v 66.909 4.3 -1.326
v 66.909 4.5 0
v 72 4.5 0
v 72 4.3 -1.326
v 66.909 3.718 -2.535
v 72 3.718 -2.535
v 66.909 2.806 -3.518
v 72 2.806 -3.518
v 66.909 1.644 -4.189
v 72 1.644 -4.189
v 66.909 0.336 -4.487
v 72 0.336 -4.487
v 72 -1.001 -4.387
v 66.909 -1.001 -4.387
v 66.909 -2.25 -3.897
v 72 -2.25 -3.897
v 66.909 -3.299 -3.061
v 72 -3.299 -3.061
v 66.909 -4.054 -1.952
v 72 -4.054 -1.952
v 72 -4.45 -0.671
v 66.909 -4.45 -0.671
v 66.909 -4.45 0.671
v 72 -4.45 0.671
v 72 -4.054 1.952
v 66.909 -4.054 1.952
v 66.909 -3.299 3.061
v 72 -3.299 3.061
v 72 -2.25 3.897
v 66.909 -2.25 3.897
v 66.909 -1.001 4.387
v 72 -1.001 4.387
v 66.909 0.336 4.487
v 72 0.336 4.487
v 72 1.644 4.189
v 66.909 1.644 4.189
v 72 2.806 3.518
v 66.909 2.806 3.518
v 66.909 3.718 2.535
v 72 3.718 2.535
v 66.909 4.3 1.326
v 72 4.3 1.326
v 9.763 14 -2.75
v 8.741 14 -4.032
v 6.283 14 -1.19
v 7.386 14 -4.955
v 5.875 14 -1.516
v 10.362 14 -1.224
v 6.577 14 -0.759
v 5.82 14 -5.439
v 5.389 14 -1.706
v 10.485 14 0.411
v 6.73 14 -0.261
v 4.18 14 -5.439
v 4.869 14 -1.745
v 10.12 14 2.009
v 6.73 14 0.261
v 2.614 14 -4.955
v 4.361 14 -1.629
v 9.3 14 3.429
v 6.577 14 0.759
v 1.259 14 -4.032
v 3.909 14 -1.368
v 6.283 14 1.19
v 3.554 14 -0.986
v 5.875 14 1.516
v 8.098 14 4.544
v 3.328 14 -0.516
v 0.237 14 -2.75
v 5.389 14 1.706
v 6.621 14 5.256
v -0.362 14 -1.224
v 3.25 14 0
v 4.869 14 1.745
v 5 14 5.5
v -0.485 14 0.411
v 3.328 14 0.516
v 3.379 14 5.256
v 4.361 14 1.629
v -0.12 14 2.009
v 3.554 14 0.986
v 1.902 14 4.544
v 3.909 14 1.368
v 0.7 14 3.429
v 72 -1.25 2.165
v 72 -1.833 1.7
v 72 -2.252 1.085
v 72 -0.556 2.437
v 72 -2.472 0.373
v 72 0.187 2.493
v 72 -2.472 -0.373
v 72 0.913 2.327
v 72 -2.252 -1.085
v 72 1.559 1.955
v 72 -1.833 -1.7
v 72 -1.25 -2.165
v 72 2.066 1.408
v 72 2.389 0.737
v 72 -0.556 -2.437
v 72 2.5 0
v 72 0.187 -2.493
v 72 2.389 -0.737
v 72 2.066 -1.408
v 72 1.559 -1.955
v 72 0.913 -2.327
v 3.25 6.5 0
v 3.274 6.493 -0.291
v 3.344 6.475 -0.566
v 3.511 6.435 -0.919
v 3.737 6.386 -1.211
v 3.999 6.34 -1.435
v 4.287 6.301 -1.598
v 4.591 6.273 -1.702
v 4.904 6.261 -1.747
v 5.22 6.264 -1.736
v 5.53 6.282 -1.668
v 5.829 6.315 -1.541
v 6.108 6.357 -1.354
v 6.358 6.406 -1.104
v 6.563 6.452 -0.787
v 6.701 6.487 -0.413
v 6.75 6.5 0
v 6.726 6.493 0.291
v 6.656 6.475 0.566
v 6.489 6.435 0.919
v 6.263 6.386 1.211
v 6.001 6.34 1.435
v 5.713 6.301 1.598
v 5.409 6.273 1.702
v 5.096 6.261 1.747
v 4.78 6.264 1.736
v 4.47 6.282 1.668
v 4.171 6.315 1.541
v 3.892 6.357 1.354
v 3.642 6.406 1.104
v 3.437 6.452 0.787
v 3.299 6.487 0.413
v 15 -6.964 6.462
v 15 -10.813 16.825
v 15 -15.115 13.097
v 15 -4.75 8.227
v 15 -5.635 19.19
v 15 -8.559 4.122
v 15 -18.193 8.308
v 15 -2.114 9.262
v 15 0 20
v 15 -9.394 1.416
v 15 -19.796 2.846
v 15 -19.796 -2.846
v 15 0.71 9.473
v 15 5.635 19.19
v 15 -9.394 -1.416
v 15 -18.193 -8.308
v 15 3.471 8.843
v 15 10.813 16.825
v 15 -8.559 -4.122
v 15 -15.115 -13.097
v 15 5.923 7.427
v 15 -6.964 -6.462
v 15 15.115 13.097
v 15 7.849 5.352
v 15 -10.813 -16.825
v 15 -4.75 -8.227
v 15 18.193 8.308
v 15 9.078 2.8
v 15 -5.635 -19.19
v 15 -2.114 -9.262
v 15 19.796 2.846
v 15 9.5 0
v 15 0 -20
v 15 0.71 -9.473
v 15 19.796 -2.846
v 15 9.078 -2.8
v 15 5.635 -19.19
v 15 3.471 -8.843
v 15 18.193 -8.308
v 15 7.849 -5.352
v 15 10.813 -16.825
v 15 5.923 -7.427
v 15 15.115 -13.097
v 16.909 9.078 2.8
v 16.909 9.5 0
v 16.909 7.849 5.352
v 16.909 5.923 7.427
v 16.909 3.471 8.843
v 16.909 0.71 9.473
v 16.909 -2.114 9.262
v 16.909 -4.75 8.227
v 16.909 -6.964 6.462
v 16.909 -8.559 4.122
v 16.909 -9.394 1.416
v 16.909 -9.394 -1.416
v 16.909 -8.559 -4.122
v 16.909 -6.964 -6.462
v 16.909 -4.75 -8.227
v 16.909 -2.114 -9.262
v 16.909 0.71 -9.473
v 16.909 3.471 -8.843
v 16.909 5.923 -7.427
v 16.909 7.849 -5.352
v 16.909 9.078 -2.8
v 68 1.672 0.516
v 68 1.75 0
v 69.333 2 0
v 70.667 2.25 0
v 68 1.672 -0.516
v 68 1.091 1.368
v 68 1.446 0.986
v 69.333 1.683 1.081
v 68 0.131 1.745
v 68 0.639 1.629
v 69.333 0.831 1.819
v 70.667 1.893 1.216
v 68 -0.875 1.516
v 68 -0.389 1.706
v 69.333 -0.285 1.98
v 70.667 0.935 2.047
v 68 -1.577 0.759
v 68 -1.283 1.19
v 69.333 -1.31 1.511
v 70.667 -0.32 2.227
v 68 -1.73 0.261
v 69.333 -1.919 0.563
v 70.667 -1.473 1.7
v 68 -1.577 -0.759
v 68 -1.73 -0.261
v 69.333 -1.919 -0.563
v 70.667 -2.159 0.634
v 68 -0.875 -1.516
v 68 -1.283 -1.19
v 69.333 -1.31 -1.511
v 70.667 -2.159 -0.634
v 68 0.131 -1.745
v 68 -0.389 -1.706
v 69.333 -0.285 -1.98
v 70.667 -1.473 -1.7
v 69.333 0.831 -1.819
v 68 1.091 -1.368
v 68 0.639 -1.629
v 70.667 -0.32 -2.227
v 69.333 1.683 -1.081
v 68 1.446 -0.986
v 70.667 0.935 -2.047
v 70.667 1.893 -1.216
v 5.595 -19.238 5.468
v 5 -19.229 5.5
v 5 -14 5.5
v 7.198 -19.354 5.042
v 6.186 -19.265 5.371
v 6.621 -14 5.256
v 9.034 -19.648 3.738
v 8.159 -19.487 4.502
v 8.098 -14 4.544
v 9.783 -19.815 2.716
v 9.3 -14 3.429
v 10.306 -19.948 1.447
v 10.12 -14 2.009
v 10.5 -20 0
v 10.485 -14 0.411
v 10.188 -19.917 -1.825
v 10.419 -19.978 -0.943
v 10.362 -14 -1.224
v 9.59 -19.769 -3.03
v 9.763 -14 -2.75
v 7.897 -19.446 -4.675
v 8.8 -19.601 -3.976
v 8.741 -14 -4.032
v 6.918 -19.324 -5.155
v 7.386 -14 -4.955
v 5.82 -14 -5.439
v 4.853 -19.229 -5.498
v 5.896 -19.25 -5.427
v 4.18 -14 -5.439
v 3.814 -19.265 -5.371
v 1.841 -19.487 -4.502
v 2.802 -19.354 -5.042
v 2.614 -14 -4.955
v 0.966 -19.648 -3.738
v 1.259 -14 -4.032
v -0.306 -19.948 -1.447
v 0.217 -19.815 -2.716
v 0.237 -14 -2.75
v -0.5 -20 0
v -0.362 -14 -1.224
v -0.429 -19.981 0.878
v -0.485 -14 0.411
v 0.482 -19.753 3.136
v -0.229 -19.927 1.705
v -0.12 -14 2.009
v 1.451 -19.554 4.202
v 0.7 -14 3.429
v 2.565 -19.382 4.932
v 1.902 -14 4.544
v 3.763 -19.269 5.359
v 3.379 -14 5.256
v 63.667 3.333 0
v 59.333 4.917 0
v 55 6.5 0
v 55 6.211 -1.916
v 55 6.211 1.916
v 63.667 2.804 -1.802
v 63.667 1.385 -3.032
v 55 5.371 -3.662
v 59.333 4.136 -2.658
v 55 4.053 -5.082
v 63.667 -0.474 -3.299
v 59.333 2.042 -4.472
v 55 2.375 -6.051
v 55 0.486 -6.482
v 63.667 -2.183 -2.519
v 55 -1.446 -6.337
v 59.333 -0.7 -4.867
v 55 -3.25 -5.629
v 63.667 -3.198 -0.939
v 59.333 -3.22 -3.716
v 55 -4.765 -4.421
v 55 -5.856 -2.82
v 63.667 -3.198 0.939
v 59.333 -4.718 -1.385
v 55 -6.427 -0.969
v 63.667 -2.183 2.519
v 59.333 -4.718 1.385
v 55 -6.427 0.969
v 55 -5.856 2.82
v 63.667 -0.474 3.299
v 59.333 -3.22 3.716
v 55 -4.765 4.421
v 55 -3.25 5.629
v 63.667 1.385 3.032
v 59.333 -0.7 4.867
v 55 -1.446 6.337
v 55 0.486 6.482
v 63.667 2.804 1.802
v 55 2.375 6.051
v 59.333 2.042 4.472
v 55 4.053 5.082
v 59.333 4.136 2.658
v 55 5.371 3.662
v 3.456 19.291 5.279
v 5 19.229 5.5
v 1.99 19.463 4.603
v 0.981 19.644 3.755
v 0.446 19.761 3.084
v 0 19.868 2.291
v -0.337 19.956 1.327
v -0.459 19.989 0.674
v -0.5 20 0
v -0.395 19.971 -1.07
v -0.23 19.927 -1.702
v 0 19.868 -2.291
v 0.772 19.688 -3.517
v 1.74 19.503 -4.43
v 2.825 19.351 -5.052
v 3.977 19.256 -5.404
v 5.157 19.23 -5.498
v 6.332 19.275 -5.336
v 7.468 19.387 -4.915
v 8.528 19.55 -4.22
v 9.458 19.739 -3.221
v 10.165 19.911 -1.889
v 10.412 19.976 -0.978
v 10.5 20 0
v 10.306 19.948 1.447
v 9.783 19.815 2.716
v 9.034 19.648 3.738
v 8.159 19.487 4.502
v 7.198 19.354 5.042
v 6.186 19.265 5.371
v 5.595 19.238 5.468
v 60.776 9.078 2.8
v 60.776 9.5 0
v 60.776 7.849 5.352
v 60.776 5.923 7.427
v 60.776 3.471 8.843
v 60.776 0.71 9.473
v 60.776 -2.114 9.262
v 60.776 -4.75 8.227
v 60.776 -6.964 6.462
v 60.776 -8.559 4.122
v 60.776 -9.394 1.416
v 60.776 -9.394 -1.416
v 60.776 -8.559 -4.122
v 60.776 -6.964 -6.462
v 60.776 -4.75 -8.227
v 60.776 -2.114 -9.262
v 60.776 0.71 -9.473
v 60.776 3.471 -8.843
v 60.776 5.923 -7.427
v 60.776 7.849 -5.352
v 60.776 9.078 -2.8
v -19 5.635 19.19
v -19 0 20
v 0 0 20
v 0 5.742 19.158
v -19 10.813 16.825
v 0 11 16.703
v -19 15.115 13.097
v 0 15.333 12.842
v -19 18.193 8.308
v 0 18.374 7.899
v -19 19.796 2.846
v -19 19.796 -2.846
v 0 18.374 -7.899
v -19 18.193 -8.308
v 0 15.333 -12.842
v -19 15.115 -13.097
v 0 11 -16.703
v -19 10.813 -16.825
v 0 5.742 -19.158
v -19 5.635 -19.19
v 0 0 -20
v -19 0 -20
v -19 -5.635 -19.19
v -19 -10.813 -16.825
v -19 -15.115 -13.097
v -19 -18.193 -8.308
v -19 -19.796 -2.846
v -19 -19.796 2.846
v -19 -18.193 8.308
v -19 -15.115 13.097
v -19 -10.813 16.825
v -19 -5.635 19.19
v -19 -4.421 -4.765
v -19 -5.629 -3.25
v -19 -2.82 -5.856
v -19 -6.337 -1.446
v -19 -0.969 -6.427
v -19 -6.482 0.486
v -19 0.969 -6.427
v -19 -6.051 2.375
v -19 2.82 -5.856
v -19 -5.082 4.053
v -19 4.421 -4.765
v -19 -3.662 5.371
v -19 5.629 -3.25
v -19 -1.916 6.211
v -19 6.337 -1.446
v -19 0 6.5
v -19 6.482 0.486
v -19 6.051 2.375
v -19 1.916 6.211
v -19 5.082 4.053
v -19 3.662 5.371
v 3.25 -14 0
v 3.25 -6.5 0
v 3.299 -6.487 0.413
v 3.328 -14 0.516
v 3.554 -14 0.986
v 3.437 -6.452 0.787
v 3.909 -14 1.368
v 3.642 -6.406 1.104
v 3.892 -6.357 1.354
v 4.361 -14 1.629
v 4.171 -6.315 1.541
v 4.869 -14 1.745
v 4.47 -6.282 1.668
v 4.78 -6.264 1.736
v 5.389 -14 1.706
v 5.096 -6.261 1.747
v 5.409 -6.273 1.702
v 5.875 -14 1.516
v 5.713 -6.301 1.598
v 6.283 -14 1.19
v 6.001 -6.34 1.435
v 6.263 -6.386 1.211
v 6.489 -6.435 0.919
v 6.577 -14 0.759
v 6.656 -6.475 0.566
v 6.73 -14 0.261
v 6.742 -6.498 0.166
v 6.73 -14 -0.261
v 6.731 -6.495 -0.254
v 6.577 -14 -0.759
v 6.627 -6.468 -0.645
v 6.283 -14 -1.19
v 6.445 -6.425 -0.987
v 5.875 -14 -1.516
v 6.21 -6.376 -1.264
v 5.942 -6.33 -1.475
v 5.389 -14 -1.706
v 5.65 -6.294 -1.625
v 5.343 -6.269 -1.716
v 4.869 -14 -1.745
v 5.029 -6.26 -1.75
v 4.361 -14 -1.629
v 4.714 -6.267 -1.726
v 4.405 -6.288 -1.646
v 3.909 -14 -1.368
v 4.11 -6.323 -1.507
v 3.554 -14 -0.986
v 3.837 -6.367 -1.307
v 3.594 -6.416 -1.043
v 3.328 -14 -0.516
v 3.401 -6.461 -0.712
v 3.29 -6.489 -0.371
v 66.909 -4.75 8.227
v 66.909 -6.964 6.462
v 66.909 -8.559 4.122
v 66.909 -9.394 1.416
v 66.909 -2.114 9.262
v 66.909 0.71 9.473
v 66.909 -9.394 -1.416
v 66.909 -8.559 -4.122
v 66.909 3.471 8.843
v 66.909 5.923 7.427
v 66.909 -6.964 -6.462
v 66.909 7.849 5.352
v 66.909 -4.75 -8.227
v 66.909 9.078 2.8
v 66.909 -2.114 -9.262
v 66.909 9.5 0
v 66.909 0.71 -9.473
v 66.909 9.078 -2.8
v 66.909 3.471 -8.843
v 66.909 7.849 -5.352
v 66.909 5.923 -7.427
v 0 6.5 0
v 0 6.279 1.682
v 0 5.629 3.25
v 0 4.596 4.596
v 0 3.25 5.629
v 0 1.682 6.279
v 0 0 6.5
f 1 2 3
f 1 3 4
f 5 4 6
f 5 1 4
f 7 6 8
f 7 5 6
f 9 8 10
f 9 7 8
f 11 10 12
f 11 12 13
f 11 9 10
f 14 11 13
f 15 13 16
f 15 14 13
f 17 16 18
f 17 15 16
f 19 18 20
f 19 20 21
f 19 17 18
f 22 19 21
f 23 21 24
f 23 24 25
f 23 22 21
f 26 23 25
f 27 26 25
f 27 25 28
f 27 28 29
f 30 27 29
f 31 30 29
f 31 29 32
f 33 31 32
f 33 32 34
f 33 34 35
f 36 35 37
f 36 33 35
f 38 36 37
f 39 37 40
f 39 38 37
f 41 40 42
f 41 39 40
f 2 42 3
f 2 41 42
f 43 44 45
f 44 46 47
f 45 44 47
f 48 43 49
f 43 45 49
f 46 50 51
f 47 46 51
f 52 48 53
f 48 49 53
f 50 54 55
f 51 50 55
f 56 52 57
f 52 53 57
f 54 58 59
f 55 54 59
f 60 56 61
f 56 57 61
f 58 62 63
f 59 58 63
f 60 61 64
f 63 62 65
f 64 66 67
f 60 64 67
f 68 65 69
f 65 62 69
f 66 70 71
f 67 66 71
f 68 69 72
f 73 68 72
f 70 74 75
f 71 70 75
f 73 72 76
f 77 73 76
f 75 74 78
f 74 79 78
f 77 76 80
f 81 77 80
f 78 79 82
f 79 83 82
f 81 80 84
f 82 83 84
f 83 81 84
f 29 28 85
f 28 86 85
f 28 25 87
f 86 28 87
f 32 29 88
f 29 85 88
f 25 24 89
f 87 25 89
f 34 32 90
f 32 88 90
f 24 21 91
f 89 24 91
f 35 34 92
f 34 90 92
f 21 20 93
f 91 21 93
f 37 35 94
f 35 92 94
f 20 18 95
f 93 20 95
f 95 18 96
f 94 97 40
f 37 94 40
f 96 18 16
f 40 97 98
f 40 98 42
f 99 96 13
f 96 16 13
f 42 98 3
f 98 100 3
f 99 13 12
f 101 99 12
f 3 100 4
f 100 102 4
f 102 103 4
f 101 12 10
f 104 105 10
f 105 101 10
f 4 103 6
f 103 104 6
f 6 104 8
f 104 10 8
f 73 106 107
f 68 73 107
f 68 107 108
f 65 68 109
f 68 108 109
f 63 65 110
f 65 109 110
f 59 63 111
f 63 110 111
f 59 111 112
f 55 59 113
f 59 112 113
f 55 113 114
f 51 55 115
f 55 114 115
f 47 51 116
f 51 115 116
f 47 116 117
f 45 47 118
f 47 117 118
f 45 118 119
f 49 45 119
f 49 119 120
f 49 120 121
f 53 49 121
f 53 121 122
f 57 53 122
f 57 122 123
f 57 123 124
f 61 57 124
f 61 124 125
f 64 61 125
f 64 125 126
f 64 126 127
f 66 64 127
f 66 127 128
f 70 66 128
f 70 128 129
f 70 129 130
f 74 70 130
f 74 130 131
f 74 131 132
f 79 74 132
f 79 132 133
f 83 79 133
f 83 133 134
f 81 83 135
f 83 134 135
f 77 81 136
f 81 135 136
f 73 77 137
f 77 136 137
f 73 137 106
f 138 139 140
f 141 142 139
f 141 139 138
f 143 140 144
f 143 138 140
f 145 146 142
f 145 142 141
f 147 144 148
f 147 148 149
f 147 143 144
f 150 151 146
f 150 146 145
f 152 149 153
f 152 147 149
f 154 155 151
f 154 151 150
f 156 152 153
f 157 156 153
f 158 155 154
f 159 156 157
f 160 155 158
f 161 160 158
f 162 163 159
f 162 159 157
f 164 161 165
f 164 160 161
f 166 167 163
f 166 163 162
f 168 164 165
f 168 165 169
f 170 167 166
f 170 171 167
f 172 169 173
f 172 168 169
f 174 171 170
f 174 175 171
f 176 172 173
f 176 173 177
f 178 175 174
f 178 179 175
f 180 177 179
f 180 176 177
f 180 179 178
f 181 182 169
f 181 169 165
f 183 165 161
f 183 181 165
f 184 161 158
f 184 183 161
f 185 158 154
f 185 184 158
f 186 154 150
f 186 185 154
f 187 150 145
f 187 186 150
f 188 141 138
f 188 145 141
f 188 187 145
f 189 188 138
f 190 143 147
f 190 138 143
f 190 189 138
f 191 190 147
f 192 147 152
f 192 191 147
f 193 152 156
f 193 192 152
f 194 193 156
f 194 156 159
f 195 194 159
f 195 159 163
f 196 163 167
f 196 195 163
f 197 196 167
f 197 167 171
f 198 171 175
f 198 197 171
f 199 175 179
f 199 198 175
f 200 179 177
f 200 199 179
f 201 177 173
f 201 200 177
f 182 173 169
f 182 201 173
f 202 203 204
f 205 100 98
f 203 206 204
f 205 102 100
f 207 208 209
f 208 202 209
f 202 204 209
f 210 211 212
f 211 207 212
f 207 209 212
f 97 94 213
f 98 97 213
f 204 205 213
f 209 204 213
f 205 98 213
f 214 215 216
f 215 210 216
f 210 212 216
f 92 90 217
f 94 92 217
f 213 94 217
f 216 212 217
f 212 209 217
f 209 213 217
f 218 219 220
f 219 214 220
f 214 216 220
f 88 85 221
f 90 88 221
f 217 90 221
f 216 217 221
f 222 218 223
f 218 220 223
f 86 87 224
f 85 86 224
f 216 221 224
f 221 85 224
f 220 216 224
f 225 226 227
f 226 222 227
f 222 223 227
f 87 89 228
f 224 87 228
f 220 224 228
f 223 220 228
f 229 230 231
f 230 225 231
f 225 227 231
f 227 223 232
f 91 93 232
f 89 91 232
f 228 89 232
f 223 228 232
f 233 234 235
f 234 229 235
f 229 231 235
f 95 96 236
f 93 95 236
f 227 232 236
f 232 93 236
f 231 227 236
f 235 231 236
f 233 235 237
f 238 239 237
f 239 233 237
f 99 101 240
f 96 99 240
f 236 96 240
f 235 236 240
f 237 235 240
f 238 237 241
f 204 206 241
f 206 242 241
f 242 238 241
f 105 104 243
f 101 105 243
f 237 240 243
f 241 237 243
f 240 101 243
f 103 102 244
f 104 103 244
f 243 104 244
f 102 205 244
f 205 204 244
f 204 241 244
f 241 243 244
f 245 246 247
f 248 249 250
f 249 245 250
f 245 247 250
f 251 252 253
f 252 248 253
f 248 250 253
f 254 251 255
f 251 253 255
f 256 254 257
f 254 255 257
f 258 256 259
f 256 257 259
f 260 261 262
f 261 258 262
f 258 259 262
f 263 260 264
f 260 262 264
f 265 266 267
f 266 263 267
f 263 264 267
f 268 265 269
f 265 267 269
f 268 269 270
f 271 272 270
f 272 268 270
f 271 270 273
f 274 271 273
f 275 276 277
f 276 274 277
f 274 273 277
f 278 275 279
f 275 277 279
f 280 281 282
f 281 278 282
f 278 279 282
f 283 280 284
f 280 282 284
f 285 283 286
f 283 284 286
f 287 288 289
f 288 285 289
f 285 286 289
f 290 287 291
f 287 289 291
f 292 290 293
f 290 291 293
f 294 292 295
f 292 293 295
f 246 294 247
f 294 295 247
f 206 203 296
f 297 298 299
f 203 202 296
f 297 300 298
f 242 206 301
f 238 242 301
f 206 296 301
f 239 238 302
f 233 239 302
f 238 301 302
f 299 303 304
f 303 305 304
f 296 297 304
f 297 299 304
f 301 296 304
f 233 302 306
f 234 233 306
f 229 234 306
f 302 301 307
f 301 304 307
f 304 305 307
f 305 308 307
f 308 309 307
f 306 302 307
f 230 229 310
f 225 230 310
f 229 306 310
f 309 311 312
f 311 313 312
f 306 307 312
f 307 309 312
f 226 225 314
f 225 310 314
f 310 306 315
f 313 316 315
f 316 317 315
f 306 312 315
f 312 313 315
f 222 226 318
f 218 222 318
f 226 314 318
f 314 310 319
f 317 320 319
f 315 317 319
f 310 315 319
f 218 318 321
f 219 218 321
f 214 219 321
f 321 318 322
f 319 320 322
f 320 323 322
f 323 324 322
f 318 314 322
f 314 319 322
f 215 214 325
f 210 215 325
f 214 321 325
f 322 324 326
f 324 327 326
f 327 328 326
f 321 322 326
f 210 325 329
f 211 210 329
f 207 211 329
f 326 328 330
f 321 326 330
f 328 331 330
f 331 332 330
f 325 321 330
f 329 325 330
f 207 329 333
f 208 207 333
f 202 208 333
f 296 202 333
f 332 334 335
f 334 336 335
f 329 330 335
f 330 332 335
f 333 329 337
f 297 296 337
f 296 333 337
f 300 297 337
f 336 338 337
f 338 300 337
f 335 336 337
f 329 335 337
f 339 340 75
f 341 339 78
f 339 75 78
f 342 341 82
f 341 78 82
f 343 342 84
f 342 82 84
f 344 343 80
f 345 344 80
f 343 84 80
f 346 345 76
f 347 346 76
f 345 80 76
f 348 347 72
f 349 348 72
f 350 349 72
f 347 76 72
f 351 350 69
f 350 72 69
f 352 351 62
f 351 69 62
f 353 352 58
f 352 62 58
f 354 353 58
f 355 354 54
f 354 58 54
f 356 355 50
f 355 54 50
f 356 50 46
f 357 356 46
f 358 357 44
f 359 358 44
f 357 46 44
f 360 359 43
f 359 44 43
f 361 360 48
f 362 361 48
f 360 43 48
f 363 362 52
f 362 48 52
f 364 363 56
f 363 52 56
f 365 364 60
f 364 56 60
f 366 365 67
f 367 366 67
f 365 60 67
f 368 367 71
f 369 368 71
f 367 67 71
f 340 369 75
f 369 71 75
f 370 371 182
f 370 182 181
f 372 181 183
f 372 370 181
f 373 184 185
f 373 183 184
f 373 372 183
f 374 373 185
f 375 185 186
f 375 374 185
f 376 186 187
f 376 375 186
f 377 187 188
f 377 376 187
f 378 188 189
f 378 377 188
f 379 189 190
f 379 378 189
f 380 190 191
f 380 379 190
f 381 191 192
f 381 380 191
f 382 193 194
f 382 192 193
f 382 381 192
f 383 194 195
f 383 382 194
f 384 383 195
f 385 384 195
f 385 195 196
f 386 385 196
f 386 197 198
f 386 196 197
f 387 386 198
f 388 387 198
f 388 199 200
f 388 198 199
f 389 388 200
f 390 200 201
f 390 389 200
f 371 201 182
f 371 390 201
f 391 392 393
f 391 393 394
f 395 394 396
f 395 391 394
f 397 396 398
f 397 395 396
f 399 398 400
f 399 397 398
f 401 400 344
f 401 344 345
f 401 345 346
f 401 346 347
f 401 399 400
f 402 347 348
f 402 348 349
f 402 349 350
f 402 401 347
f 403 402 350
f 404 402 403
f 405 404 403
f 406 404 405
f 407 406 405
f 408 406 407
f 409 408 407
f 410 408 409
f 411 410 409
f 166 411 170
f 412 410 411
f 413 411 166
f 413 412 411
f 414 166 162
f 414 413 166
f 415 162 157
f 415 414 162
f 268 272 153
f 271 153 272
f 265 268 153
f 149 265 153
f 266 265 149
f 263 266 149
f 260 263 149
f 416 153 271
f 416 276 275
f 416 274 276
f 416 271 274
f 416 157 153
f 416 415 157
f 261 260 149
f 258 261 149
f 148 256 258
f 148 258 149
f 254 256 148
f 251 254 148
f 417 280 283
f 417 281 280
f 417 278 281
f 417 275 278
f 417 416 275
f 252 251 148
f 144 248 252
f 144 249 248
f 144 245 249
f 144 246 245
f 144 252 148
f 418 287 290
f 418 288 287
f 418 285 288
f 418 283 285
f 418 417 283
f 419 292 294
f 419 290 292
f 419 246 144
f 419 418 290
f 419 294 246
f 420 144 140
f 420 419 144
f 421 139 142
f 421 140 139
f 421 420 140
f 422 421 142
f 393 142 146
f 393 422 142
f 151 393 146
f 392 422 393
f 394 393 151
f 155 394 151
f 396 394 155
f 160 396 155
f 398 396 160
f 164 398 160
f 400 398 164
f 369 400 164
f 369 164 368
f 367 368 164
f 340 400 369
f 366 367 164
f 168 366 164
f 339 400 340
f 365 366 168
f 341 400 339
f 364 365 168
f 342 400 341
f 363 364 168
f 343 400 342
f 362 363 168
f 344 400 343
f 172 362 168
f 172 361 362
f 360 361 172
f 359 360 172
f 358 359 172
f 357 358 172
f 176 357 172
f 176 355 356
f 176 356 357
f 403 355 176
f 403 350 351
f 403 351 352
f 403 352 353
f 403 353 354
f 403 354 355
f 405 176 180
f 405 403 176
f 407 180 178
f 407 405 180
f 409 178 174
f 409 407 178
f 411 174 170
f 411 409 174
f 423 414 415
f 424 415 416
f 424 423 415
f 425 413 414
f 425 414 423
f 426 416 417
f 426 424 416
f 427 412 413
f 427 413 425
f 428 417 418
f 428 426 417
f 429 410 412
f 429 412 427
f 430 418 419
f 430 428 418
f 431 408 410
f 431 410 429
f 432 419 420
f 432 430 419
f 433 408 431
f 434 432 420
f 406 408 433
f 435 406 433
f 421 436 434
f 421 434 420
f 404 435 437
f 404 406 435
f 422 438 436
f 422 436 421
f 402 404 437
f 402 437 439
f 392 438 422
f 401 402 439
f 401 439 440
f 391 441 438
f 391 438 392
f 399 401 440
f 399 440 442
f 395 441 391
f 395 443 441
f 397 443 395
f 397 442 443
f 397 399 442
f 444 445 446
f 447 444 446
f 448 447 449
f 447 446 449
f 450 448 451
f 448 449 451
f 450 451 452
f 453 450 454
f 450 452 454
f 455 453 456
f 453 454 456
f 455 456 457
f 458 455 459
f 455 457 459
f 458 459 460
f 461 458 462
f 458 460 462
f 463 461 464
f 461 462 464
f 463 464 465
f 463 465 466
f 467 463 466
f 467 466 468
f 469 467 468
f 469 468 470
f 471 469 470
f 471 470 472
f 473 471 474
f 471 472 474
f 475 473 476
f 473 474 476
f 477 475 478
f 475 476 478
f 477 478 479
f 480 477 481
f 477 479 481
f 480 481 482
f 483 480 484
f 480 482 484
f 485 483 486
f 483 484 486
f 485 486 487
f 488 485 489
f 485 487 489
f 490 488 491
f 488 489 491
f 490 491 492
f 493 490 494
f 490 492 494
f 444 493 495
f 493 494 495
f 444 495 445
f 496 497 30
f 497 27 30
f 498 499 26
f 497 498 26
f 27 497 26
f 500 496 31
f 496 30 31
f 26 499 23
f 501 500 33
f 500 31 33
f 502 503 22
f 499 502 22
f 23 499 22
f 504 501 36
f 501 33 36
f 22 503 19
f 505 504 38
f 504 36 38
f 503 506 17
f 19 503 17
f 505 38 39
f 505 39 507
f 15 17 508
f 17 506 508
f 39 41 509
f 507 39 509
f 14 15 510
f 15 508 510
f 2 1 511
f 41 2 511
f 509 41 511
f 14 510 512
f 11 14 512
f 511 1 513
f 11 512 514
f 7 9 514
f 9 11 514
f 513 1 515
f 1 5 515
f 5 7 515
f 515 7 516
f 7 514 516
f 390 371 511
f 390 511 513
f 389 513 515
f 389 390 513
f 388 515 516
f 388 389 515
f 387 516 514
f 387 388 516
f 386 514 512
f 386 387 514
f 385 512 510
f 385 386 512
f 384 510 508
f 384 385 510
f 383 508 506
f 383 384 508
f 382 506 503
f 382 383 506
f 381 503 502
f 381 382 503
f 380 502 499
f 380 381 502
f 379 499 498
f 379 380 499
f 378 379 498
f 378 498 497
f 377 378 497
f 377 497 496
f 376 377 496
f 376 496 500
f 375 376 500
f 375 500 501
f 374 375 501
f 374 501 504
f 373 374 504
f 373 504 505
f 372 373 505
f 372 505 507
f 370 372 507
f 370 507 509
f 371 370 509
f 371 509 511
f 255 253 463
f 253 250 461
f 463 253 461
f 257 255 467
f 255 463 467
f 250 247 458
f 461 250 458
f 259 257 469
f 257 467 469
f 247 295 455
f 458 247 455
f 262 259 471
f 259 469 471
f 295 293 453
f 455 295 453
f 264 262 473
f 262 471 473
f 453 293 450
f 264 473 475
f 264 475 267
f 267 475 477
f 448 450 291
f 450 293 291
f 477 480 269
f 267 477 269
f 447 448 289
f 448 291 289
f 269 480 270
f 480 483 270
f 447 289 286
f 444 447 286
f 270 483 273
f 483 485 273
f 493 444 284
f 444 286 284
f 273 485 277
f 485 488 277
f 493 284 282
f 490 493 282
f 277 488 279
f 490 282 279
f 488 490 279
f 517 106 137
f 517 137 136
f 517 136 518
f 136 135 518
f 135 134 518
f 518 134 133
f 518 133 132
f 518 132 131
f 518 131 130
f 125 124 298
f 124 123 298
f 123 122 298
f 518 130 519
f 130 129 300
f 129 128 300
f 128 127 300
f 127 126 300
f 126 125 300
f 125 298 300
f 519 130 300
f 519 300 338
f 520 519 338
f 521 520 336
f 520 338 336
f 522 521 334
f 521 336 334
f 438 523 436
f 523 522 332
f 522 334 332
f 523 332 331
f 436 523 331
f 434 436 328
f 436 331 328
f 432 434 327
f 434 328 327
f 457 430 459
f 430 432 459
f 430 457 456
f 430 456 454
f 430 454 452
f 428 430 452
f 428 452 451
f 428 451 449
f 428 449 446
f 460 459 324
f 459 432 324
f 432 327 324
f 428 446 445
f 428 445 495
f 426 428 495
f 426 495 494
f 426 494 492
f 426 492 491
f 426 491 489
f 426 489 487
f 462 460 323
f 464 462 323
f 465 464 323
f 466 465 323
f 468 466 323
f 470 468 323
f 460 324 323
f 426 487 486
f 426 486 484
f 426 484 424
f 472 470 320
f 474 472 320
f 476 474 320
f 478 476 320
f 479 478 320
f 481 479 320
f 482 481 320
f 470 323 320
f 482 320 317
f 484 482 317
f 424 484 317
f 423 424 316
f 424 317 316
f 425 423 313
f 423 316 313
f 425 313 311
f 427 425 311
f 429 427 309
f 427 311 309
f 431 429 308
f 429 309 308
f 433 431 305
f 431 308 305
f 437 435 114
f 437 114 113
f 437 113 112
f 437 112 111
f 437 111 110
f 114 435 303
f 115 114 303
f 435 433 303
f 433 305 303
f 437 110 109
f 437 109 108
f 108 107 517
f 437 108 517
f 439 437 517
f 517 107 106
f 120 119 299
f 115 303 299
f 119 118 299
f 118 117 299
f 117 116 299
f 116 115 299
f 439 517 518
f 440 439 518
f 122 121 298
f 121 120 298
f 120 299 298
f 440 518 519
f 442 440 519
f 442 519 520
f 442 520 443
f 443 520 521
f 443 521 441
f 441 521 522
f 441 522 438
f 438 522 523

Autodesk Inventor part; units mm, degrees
ref_plane "YZ Plane" through (0, 0, 0) normal (1, 0, 0) x (0, 1, 0)
sketch "Sketch1" plane through (0, 0, 0) normal (0, 0, 1) x (1, 0, 0)
  line L0 (0, 0) -> (0, 6.5)
  line L1 (0, 6.5) -> (55, 6.5)
  line L2 (68, 1.75) -> (55, 6.5)
  line L3 (72, 0) -> (72, 2.5)
  line L4 (72, 2.5) -> (68, 1.75)
  line L5 (0, 6.5) -> (0, 9.5)
  line L6 (0, 9.5) -> (60.7761, 9.5)
  line L7 (72, 0) -> (0, 0)
  line L8 (72, 2.5) -> (72, 4.5)
  line L9 (72, 4.5) -> (66.9088, 4.5)
  line L10 (66.9088, 4.5) -> (66.9088, 9.5)
  line L11 (66.9088, 9.5) -> (60.7761, 9.5)
  line L12 (66.9088, 9.5) -> (66.9088, 9.5)
  line L13 (66.9088, 9.5) -> (16.9088, 9.5)
  line L14 (16.9088, 9.5) -> (16.9088, 9.5)
  point P0 (72, 1.25)
  dimension "d0" = 6.5
  dimension "d1" = 55
  dimension "d5" = 2.5
  dimension "d6" = 3
  dimension "d7" = 0
  dimension "d8" = 50
  dimension "d44" = 1.75
  dimension "d45" = 4
  dimension "d46" = 13
revolve "Revolution1" add sketch "Sketch1" angle 360 about axis through (72, 0, 0) along (-1, 0, 0) contours L5 L6 L11 L10 L9 L8 L4 L2 L1
sketch "Sketch2" plane through (0, 0, 0) normal (-1, 0, 0) x (0, 0, 1)
  circle A0 centre (0, 0) radius 2.5 projected
  circle A1 centre (0, 0) radius 20
  circle A2 centre (0, 0) radius 6.5
  dimension "d10" = 40
  dimension "d11" = 13
extrude "Extrusion1" add sketch "Sketch2" along normal blind 19 contours A1
sketch "Sketch3" plane through (0, 0, 0) normal (1, 0, 0) x (0, 0, -1)
  circle A0 centre (0, 0) radius 1.75 projected
  circle A1 centre (0, 0) radius 20
  circle A2 centre (0, 0) radius 4.5 projected
  circle A3 centre (0, 0) radius 9.5
  dimension "d18" = 40
  dimension "d37" = 19
extrude "Extrusion2" add sketch "Sketch3" along normal blind 15 contours A1
sketch "Sketch4" plane through (0, 0, 0) normal (0, 1, 0) x (-1, 0, 0)
  line L0 (19, -20) -> (19, 20) projected
  line L1 (19, 0) -> (-5, 0)
  circle A0 centre (-5, 0) radius 1.75
  point P0 (0, 0)
  dimension "d21" = 24
  dimension "d22" = 3.5
extrude "Extrusion3" cut sketch "Sketch4" along normal through all both and the other way through all
ref_plane "Work Plane1" through (0, 20, 0) normal (0, 1, 0) x (-1, 0, 0)
sketch "Sketch5" plane through (0, 20, 0) normal (0, 1, 0) x (-1, 0, 0)
  line L0 (19, -20) -> (19, 20) projected
  line L1 (19, 0) -> (-5, 0)
  circle A0 centre (-5, 0) radius 3.175
  point P0 (0, 0)
  dimension "d26" = 24
  dimension "d27" = 6.35
hole "Hole1" at (5, 20, 0) direction (0, -1, 0) diameter 2 end through all counterbore diameter 11 counterbore depth 6
thread "Thread3" size "Rc 1/4" standard "BSP Taper Internal" length 11
mirror "Mirror1" about plane through (0, 0, 0) normal (0, 1, 0) of "Hole1"
thread "Thread4" size "M14x1.25" class "6H" standard "ANSI Metric M Profile" length 19
ref_plane "Work Plane3" through (0, 0, 0) normal (-1, 0, 0) x (0, 0, 1)
ref_plane "Work Plane2" through (0, 0, 0) normal (0, 1, 0) x (-1, 0, 0)
properties part number "ASI Propane" material "Stainless Steel"
